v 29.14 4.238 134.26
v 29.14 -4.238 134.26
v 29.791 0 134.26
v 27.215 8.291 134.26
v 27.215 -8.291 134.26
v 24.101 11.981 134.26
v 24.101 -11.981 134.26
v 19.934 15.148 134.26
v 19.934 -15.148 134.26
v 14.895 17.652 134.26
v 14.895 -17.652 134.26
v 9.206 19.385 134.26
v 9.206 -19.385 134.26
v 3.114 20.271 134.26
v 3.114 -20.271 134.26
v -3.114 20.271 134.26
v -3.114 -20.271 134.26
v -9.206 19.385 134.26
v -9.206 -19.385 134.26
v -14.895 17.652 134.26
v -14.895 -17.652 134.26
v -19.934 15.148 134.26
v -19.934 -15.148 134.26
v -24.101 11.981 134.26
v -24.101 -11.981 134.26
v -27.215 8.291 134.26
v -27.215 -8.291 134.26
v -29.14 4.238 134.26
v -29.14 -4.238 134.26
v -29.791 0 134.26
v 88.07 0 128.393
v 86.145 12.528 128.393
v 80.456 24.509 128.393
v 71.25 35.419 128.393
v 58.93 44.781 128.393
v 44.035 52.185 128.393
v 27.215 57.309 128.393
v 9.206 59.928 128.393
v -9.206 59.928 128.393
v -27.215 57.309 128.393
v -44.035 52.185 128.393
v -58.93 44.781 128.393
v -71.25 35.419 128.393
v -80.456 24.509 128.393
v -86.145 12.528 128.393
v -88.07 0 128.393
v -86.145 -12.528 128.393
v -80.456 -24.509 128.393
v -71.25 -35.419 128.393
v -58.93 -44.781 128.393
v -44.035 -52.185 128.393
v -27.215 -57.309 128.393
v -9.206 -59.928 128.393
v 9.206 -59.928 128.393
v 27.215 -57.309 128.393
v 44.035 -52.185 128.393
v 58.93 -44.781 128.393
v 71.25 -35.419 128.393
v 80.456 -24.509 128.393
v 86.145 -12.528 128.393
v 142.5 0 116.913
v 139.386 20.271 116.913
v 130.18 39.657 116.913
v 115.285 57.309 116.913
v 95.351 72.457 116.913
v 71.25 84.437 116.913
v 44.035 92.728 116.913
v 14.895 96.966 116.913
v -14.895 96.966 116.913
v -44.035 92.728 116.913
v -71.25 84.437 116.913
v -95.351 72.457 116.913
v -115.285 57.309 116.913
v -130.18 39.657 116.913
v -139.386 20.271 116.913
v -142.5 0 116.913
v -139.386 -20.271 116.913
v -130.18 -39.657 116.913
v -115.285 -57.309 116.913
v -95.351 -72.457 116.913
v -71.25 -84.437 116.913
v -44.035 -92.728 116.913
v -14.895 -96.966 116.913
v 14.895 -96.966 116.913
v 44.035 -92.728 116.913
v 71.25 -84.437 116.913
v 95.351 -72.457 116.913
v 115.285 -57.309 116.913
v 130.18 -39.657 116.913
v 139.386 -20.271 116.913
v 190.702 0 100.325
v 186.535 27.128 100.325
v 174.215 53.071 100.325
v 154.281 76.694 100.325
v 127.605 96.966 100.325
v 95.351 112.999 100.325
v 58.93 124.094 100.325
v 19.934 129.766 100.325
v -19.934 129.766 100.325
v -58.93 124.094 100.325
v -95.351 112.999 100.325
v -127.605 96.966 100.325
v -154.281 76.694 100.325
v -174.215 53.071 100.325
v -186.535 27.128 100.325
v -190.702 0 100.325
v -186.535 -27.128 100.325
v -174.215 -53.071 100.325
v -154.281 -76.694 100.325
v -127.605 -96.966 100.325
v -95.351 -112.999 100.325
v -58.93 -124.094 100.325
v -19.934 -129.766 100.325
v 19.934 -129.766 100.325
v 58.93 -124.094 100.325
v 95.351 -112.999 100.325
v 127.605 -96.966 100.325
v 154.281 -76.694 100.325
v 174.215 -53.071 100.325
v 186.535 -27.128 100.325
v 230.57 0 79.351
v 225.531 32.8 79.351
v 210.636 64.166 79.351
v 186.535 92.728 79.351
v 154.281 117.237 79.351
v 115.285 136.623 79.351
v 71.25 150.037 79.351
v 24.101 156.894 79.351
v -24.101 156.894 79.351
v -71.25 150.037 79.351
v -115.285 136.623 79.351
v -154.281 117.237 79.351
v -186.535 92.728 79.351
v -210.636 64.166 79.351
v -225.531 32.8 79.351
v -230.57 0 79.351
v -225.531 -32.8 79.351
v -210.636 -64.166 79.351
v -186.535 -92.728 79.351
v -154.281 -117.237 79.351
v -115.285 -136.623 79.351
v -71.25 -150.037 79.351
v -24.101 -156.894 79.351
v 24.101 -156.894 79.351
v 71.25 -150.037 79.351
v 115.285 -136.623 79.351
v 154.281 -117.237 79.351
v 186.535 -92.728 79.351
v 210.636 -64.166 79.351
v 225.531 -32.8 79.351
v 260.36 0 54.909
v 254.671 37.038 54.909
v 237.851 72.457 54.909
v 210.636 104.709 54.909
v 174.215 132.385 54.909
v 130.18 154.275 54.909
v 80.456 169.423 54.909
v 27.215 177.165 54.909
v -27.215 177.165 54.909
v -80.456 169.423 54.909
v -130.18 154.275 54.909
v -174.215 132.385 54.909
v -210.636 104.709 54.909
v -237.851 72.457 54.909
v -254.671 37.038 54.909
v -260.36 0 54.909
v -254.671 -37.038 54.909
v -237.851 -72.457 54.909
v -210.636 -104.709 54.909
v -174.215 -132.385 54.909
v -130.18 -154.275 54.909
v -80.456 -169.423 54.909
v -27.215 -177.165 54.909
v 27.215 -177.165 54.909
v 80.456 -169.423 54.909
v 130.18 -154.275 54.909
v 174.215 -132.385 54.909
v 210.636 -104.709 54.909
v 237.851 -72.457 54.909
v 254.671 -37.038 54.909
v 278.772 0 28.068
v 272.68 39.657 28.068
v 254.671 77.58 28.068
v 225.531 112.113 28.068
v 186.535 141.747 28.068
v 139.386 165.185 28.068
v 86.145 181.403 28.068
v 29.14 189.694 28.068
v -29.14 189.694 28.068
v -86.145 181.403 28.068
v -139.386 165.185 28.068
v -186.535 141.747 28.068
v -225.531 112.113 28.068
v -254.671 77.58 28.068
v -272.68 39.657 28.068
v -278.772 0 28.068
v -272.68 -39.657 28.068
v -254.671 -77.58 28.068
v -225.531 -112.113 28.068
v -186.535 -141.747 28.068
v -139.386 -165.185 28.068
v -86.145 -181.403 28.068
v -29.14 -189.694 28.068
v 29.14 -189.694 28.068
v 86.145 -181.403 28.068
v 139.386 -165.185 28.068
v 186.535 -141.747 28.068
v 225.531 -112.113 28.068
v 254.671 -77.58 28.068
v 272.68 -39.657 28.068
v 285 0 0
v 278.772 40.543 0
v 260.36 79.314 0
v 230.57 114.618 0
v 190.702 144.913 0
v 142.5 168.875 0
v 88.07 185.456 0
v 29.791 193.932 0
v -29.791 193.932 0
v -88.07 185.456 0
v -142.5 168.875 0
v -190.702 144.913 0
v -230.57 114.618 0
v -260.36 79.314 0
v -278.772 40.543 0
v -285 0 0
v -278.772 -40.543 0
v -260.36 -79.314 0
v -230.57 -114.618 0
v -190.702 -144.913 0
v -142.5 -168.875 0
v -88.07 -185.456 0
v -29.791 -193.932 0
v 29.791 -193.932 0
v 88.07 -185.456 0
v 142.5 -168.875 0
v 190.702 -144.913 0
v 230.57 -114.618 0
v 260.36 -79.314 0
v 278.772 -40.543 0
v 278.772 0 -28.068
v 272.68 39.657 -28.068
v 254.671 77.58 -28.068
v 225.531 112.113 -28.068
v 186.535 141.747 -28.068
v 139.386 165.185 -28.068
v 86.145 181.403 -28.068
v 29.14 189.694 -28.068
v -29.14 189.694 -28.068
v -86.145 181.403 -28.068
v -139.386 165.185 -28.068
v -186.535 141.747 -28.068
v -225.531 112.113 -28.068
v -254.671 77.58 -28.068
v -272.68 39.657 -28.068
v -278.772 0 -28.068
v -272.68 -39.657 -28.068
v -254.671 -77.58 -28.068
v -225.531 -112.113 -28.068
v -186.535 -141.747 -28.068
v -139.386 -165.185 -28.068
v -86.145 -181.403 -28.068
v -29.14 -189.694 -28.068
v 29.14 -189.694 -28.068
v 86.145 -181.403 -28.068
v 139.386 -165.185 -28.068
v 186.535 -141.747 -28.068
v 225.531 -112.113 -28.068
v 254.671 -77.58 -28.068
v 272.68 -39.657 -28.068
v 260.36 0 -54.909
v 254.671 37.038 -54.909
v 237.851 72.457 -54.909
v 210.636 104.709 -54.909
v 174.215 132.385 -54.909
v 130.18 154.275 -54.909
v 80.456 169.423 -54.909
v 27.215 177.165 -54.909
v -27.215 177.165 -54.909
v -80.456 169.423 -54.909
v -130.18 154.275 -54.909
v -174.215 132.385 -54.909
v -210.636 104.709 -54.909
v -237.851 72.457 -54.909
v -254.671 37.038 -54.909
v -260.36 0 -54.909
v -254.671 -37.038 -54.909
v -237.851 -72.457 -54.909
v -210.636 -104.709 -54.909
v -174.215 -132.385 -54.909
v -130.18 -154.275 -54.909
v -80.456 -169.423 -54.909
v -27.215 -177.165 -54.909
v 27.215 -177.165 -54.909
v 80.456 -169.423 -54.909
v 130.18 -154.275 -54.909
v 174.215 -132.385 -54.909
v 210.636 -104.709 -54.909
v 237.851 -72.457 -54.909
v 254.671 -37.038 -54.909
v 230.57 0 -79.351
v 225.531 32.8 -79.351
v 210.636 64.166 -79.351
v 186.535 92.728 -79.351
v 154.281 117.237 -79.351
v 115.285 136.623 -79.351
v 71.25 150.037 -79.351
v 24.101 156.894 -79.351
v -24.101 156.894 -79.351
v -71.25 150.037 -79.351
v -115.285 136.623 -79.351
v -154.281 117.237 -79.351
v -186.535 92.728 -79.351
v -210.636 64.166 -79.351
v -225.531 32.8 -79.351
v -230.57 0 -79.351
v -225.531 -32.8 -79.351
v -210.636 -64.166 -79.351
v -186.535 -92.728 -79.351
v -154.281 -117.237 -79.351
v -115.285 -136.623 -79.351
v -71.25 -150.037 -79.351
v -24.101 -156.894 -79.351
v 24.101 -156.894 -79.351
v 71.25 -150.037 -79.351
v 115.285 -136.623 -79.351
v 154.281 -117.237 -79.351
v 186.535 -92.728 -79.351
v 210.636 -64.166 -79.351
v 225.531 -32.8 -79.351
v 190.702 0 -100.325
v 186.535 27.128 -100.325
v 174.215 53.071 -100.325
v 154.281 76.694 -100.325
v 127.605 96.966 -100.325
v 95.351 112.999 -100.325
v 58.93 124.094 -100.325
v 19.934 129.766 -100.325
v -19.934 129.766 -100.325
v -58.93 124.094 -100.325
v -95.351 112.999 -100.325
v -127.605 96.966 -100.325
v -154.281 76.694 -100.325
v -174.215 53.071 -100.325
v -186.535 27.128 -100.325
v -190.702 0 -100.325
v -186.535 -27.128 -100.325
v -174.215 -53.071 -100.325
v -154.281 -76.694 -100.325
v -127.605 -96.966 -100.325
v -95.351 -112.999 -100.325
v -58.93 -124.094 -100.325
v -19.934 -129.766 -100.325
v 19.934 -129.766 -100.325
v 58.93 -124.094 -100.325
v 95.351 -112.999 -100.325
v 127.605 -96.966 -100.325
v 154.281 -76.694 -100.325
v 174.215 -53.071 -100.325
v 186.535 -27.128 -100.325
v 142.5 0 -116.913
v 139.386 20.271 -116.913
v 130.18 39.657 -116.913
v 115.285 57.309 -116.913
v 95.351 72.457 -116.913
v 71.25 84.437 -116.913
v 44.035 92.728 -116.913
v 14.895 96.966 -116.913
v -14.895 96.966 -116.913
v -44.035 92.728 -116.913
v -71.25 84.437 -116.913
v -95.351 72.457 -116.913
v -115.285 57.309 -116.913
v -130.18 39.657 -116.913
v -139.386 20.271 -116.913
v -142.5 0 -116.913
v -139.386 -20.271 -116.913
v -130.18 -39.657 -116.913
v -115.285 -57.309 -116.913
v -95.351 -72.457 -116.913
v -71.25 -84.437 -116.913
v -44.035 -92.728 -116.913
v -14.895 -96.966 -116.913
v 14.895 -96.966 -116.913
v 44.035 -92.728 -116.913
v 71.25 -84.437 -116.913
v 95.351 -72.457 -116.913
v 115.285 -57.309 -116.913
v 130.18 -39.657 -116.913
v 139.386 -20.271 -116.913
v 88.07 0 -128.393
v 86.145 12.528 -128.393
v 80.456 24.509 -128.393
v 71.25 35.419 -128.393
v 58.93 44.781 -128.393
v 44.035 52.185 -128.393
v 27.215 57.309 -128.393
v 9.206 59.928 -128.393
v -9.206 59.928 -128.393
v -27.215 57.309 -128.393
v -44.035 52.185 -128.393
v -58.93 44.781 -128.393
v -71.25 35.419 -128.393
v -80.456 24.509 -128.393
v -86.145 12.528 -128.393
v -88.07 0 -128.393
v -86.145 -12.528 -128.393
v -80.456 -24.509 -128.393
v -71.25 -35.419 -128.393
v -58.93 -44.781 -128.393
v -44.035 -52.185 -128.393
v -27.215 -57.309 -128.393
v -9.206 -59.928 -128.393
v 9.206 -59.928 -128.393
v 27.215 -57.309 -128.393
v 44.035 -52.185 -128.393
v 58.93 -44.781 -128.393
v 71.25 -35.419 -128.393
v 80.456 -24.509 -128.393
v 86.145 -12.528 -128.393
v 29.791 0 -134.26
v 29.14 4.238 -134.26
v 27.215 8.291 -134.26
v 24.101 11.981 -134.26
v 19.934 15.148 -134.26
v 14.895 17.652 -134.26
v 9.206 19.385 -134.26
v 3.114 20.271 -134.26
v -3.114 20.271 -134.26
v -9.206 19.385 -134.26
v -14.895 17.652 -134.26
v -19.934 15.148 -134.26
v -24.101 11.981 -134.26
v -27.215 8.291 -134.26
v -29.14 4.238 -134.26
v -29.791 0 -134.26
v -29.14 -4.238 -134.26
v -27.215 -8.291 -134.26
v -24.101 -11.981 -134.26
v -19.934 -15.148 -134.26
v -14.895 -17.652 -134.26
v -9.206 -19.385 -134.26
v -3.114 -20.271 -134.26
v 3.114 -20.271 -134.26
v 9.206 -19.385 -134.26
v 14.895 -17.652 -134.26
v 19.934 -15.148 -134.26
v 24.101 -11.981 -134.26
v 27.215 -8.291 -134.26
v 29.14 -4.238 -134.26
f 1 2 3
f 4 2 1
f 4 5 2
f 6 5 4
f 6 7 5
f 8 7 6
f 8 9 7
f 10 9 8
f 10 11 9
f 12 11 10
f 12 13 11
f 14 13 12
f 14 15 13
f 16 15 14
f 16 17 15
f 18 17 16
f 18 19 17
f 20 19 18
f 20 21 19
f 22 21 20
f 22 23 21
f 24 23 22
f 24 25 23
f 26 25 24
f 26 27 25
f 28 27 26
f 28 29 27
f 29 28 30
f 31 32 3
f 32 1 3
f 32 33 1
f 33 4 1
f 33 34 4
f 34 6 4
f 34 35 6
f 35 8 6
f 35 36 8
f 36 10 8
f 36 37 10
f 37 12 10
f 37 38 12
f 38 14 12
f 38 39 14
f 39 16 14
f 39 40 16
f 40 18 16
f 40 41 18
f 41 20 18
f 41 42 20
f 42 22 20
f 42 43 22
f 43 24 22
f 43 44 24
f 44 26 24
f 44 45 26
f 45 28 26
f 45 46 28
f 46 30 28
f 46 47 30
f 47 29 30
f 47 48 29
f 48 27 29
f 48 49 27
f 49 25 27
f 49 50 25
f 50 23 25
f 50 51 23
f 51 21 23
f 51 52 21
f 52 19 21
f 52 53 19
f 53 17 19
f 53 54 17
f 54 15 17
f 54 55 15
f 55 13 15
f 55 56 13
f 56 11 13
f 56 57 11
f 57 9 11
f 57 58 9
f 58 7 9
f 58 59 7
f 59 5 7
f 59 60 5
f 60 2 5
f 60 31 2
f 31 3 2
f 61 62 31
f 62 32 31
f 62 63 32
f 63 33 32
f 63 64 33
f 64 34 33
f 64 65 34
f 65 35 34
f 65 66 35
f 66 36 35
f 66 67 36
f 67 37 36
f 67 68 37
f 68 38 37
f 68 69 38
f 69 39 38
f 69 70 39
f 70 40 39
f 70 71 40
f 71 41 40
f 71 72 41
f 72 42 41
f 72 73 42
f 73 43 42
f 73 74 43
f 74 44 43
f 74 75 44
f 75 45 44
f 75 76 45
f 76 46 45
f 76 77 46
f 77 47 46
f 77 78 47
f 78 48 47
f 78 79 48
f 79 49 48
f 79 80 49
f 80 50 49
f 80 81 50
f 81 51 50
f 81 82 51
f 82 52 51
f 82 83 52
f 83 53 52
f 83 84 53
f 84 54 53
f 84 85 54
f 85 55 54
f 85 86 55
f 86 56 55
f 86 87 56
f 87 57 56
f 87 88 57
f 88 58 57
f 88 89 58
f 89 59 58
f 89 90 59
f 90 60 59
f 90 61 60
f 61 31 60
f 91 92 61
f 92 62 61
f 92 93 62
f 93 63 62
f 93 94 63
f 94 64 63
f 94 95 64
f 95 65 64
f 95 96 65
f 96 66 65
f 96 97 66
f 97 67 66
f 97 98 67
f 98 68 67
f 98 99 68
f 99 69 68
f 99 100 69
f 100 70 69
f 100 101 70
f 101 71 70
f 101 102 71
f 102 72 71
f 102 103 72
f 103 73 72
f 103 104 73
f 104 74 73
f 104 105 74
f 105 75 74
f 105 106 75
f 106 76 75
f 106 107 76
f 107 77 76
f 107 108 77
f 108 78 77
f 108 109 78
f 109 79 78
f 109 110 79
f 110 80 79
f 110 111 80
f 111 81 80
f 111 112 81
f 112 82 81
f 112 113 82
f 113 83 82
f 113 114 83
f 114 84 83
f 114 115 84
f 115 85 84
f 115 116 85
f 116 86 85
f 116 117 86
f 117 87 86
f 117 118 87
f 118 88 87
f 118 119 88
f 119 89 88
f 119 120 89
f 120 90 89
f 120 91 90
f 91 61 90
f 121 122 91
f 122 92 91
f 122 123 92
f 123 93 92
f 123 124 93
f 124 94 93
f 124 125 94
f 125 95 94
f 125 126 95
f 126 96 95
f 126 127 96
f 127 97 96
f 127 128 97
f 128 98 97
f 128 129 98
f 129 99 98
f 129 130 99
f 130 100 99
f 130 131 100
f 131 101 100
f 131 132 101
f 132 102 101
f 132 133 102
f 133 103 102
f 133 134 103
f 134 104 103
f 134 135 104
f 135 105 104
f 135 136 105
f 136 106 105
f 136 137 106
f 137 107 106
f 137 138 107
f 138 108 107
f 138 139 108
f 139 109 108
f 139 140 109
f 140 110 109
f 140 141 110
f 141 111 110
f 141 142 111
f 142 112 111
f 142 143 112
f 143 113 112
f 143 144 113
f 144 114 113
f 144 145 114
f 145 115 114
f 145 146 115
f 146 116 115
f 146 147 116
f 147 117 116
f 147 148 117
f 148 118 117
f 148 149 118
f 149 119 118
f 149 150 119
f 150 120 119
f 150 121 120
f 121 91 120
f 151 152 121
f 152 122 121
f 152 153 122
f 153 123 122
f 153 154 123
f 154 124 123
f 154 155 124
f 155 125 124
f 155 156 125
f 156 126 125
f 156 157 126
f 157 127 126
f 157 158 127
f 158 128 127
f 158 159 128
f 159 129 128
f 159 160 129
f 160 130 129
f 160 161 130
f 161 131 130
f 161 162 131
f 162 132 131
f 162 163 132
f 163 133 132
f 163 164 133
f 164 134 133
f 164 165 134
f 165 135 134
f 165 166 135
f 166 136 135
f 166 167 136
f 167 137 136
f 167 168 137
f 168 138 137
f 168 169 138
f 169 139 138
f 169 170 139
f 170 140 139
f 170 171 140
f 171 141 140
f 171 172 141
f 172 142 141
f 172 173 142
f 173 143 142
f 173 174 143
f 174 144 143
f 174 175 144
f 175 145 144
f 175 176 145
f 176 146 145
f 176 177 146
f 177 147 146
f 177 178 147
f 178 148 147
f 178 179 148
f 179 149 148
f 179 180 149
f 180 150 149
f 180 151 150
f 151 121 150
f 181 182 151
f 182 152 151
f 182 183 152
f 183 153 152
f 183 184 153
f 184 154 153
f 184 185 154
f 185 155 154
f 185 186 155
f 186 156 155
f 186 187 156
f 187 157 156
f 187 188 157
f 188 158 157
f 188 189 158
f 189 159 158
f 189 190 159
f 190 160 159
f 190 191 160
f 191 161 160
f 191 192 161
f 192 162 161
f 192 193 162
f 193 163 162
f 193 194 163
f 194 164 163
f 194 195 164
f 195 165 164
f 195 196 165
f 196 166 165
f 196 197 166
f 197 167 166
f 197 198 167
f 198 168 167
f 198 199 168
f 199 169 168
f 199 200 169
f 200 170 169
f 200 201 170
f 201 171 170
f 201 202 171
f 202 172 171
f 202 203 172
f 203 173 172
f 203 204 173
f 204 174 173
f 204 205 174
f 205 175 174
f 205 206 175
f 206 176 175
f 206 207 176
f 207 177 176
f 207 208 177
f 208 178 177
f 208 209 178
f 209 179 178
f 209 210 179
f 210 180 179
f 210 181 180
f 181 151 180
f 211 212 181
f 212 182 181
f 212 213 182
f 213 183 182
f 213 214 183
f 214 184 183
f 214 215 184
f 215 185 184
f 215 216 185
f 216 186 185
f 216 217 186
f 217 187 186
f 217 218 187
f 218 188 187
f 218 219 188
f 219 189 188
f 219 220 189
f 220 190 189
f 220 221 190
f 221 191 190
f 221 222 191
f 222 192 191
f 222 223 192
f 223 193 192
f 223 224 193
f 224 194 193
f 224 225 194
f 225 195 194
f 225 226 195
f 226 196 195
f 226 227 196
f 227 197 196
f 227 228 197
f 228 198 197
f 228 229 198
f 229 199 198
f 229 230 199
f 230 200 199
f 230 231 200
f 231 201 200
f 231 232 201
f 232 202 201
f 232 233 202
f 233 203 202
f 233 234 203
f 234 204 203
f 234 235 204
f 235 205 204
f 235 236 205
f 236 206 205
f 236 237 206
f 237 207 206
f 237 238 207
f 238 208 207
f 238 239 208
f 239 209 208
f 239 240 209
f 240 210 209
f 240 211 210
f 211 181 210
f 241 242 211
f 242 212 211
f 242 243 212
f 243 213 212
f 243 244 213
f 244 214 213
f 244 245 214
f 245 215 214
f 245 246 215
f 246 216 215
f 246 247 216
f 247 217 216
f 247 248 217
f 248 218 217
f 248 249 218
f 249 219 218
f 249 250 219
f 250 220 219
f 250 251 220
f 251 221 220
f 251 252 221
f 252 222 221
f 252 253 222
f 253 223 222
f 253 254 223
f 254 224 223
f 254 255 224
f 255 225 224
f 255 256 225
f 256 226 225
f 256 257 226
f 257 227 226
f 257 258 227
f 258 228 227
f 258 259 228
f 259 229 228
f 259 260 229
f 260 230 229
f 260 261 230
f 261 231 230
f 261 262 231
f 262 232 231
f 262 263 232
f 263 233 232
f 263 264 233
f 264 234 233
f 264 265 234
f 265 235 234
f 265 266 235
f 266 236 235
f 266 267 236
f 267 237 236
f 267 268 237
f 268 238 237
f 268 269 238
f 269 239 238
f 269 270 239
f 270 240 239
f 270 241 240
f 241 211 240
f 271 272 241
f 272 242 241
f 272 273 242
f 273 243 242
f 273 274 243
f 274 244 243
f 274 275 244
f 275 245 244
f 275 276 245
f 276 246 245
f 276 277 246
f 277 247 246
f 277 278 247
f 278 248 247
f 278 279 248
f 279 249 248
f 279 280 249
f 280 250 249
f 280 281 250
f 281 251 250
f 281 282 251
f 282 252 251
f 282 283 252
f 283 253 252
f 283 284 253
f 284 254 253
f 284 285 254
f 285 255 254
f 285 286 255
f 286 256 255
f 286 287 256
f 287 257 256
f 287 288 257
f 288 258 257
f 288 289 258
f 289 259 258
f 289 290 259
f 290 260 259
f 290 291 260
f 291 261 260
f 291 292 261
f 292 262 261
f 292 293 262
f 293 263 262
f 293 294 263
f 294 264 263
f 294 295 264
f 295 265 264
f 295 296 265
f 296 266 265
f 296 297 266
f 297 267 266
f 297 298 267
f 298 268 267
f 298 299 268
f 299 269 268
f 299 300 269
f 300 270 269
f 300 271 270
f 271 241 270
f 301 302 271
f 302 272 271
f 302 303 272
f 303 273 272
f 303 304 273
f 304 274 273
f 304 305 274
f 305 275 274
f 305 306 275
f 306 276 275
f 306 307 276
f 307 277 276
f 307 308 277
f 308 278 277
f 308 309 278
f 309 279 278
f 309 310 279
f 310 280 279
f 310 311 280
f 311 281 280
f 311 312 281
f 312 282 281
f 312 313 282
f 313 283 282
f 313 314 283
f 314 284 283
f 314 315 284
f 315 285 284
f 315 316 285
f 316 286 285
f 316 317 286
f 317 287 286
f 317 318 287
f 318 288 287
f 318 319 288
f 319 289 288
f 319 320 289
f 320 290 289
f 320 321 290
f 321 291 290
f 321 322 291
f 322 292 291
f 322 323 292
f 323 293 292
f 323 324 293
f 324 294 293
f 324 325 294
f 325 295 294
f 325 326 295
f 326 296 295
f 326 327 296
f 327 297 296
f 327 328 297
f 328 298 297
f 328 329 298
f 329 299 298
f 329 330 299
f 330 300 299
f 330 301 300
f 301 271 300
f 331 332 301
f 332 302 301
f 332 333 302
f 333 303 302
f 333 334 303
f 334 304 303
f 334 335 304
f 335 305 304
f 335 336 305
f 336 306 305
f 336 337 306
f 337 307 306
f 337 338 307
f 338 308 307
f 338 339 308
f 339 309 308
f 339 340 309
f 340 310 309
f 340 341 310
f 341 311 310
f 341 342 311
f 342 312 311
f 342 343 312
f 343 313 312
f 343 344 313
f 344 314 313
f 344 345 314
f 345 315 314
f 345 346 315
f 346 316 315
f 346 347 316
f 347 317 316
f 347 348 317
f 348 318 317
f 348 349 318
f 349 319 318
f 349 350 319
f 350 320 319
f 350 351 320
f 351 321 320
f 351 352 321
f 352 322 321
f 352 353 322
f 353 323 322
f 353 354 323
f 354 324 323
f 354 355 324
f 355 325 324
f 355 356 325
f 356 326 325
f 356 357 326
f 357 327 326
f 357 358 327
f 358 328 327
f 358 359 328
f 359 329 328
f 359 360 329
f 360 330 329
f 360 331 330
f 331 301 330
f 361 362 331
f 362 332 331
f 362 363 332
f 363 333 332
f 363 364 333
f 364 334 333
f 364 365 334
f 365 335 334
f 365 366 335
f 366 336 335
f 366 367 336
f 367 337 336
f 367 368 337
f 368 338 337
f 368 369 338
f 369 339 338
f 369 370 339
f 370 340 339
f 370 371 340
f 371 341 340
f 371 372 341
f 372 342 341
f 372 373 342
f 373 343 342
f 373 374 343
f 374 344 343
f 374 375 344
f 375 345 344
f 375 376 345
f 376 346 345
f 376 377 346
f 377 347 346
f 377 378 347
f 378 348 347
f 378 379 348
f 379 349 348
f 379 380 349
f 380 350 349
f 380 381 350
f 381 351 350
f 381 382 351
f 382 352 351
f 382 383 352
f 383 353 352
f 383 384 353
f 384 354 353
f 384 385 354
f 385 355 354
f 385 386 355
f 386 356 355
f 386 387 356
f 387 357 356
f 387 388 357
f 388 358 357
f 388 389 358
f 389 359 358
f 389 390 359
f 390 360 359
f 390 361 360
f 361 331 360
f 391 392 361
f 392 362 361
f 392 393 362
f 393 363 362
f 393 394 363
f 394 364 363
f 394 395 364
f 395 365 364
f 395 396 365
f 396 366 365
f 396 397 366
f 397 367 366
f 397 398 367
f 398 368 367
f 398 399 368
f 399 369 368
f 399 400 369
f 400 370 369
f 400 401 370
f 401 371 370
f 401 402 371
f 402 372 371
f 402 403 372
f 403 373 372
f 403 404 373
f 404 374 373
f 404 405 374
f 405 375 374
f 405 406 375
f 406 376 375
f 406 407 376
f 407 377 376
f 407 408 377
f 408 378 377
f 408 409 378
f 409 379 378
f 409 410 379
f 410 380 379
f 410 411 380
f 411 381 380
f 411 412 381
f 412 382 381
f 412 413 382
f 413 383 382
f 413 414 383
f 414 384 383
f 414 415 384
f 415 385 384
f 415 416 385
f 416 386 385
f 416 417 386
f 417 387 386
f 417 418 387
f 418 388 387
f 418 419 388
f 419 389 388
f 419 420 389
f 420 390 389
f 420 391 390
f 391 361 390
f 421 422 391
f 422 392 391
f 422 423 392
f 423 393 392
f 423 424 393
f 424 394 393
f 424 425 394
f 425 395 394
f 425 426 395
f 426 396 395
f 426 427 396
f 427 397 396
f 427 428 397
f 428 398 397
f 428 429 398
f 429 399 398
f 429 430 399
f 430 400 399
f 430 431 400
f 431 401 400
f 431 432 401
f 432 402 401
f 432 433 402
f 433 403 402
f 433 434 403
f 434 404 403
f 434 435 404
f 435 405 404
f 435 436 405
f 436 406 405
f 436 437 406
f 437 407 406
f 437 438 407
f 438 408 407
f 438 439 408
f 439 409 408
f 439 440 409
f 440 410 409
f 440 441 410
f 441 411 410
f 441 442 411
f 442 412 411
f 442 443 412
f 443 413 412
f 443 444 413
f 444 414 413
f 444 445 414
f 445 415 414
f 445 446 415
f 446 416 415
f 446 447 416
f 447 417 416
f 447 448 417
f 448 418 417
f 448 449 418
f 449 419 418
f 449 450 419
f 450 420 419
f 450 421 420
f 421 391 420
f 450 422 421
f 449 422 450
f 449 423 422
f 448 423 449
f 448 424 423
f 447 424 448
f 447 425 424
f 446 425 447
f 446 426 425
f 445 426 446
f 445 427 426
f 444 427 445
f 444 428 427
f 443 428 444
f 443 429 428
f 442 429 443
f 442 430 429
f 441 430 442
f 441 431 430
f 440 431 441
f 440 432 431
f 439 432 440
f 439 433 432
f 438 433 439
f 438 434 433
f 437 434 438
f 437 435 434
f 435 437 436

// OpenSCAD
// Generated by SolidPython 1.0.1 on 2020-07-29 00:46:54


scale(v = [19, 13, 9]) {
	sphere(r = 15);
}
/***********************************************
*********      SolidPython code:      **********
************************************************
 
# import packages: SolidPython
from solid import *
from solid.utils import *
from itertools import chain, combinations, permutations


class Resize:

    def __init__(self, scad_file):
        self.scad_file = scad_file
        #self.scad_file = import_scad(scad_file)
        # cone/cylinder param:
        self.r1 = 0
        self.r2 = 0
        self.h = 0
        # rectangular prism param:
        self.w = 0
        self.l = 0
        # ellipse param:
        self.r = 0

    # import OpenScad code (file name corresponds to shape)


    # classify shape + parameters
    def assign(self, param1, param2, param3):
        if self.scad_file == 'cone.scad':
            self.r1 = param1
            self.r2 = param2
            self.h = param3
        elif self.scad_file == 'cylinder.scad':
            self.r1 = param1
            self.r2 = param2
            self.h = param3
        elif self.scad_file == 'rectangularPrism.scad':
            self.h = param1
            self.l = param2
            self.w = param3
        else:
            self.r = param1
            self.h = param2

    # resize parameters
    def iterate(self):
        x = range(3, 20, 2)
        i = 1
        if self.scad_file == 'cone.scad':
            tempList = list(permutations(x, 2))
            for temp in tempList:
                param1 = temp[0]
                param2 = temp[1]
                filepath = 'produced_scad_files/' + 'cone' + str(param1) + '_' + str(param2) + '_' + '.scad'
                scad_render_to_file(cylinder(h=param1, r1=param2, r2=0), filepath)

        elif self.scad_file == 'cylinder.scad':
            tempList = list(permutations(x, 3))
            for temp in tempList:
                param1 = temp[0]
                param2 = temp[1]
                filepath = 'produced_scad_files/' + 'cylinder' + str(param1) + '_' + str(param2) + '_' + '.scad'
                scad_render_to_file(cylinder(h=param1, r1=param2, r2=param2), filepath)

        elif self.scad_file == 'rectangularPrism.scad':
            tempList = list(permutations(x, 3))
            for temp in tempList:
                param1 = temp[0]
                param2 = temp[1]
                param3 = temp[2]
                filepath = 'produced_scad_files/' + 'rectangularPrism' + str(param1) + '_' + str(param2) + '_' + str(
                    param3) + '.scad'
                scad_render_to_file(cube(size=(param1, param2, param3)), filepath)

        elif self.scad_file == 'ellipse.scad':
            tempList = list(permutations(x, 4))
            for temp in tempList:
                param1 = temp[0]
                param2 = temp[1]
                param3 = temp[2]
                param4 = temp[3]
                filepath = 'produced_scad_files/' + 'ellipse' + str(param1) + '_' + str(param2) + '_' + str(param3) + '_' + str(param4) + '.scad'
                scad_render_to_file(scale([param1, param2, param3])(sphere(r=param4)), filepath)

    def render_to_scadfile(self):
        scad_render_to_file(scad, 'example.scad') 
 
************************************************/
